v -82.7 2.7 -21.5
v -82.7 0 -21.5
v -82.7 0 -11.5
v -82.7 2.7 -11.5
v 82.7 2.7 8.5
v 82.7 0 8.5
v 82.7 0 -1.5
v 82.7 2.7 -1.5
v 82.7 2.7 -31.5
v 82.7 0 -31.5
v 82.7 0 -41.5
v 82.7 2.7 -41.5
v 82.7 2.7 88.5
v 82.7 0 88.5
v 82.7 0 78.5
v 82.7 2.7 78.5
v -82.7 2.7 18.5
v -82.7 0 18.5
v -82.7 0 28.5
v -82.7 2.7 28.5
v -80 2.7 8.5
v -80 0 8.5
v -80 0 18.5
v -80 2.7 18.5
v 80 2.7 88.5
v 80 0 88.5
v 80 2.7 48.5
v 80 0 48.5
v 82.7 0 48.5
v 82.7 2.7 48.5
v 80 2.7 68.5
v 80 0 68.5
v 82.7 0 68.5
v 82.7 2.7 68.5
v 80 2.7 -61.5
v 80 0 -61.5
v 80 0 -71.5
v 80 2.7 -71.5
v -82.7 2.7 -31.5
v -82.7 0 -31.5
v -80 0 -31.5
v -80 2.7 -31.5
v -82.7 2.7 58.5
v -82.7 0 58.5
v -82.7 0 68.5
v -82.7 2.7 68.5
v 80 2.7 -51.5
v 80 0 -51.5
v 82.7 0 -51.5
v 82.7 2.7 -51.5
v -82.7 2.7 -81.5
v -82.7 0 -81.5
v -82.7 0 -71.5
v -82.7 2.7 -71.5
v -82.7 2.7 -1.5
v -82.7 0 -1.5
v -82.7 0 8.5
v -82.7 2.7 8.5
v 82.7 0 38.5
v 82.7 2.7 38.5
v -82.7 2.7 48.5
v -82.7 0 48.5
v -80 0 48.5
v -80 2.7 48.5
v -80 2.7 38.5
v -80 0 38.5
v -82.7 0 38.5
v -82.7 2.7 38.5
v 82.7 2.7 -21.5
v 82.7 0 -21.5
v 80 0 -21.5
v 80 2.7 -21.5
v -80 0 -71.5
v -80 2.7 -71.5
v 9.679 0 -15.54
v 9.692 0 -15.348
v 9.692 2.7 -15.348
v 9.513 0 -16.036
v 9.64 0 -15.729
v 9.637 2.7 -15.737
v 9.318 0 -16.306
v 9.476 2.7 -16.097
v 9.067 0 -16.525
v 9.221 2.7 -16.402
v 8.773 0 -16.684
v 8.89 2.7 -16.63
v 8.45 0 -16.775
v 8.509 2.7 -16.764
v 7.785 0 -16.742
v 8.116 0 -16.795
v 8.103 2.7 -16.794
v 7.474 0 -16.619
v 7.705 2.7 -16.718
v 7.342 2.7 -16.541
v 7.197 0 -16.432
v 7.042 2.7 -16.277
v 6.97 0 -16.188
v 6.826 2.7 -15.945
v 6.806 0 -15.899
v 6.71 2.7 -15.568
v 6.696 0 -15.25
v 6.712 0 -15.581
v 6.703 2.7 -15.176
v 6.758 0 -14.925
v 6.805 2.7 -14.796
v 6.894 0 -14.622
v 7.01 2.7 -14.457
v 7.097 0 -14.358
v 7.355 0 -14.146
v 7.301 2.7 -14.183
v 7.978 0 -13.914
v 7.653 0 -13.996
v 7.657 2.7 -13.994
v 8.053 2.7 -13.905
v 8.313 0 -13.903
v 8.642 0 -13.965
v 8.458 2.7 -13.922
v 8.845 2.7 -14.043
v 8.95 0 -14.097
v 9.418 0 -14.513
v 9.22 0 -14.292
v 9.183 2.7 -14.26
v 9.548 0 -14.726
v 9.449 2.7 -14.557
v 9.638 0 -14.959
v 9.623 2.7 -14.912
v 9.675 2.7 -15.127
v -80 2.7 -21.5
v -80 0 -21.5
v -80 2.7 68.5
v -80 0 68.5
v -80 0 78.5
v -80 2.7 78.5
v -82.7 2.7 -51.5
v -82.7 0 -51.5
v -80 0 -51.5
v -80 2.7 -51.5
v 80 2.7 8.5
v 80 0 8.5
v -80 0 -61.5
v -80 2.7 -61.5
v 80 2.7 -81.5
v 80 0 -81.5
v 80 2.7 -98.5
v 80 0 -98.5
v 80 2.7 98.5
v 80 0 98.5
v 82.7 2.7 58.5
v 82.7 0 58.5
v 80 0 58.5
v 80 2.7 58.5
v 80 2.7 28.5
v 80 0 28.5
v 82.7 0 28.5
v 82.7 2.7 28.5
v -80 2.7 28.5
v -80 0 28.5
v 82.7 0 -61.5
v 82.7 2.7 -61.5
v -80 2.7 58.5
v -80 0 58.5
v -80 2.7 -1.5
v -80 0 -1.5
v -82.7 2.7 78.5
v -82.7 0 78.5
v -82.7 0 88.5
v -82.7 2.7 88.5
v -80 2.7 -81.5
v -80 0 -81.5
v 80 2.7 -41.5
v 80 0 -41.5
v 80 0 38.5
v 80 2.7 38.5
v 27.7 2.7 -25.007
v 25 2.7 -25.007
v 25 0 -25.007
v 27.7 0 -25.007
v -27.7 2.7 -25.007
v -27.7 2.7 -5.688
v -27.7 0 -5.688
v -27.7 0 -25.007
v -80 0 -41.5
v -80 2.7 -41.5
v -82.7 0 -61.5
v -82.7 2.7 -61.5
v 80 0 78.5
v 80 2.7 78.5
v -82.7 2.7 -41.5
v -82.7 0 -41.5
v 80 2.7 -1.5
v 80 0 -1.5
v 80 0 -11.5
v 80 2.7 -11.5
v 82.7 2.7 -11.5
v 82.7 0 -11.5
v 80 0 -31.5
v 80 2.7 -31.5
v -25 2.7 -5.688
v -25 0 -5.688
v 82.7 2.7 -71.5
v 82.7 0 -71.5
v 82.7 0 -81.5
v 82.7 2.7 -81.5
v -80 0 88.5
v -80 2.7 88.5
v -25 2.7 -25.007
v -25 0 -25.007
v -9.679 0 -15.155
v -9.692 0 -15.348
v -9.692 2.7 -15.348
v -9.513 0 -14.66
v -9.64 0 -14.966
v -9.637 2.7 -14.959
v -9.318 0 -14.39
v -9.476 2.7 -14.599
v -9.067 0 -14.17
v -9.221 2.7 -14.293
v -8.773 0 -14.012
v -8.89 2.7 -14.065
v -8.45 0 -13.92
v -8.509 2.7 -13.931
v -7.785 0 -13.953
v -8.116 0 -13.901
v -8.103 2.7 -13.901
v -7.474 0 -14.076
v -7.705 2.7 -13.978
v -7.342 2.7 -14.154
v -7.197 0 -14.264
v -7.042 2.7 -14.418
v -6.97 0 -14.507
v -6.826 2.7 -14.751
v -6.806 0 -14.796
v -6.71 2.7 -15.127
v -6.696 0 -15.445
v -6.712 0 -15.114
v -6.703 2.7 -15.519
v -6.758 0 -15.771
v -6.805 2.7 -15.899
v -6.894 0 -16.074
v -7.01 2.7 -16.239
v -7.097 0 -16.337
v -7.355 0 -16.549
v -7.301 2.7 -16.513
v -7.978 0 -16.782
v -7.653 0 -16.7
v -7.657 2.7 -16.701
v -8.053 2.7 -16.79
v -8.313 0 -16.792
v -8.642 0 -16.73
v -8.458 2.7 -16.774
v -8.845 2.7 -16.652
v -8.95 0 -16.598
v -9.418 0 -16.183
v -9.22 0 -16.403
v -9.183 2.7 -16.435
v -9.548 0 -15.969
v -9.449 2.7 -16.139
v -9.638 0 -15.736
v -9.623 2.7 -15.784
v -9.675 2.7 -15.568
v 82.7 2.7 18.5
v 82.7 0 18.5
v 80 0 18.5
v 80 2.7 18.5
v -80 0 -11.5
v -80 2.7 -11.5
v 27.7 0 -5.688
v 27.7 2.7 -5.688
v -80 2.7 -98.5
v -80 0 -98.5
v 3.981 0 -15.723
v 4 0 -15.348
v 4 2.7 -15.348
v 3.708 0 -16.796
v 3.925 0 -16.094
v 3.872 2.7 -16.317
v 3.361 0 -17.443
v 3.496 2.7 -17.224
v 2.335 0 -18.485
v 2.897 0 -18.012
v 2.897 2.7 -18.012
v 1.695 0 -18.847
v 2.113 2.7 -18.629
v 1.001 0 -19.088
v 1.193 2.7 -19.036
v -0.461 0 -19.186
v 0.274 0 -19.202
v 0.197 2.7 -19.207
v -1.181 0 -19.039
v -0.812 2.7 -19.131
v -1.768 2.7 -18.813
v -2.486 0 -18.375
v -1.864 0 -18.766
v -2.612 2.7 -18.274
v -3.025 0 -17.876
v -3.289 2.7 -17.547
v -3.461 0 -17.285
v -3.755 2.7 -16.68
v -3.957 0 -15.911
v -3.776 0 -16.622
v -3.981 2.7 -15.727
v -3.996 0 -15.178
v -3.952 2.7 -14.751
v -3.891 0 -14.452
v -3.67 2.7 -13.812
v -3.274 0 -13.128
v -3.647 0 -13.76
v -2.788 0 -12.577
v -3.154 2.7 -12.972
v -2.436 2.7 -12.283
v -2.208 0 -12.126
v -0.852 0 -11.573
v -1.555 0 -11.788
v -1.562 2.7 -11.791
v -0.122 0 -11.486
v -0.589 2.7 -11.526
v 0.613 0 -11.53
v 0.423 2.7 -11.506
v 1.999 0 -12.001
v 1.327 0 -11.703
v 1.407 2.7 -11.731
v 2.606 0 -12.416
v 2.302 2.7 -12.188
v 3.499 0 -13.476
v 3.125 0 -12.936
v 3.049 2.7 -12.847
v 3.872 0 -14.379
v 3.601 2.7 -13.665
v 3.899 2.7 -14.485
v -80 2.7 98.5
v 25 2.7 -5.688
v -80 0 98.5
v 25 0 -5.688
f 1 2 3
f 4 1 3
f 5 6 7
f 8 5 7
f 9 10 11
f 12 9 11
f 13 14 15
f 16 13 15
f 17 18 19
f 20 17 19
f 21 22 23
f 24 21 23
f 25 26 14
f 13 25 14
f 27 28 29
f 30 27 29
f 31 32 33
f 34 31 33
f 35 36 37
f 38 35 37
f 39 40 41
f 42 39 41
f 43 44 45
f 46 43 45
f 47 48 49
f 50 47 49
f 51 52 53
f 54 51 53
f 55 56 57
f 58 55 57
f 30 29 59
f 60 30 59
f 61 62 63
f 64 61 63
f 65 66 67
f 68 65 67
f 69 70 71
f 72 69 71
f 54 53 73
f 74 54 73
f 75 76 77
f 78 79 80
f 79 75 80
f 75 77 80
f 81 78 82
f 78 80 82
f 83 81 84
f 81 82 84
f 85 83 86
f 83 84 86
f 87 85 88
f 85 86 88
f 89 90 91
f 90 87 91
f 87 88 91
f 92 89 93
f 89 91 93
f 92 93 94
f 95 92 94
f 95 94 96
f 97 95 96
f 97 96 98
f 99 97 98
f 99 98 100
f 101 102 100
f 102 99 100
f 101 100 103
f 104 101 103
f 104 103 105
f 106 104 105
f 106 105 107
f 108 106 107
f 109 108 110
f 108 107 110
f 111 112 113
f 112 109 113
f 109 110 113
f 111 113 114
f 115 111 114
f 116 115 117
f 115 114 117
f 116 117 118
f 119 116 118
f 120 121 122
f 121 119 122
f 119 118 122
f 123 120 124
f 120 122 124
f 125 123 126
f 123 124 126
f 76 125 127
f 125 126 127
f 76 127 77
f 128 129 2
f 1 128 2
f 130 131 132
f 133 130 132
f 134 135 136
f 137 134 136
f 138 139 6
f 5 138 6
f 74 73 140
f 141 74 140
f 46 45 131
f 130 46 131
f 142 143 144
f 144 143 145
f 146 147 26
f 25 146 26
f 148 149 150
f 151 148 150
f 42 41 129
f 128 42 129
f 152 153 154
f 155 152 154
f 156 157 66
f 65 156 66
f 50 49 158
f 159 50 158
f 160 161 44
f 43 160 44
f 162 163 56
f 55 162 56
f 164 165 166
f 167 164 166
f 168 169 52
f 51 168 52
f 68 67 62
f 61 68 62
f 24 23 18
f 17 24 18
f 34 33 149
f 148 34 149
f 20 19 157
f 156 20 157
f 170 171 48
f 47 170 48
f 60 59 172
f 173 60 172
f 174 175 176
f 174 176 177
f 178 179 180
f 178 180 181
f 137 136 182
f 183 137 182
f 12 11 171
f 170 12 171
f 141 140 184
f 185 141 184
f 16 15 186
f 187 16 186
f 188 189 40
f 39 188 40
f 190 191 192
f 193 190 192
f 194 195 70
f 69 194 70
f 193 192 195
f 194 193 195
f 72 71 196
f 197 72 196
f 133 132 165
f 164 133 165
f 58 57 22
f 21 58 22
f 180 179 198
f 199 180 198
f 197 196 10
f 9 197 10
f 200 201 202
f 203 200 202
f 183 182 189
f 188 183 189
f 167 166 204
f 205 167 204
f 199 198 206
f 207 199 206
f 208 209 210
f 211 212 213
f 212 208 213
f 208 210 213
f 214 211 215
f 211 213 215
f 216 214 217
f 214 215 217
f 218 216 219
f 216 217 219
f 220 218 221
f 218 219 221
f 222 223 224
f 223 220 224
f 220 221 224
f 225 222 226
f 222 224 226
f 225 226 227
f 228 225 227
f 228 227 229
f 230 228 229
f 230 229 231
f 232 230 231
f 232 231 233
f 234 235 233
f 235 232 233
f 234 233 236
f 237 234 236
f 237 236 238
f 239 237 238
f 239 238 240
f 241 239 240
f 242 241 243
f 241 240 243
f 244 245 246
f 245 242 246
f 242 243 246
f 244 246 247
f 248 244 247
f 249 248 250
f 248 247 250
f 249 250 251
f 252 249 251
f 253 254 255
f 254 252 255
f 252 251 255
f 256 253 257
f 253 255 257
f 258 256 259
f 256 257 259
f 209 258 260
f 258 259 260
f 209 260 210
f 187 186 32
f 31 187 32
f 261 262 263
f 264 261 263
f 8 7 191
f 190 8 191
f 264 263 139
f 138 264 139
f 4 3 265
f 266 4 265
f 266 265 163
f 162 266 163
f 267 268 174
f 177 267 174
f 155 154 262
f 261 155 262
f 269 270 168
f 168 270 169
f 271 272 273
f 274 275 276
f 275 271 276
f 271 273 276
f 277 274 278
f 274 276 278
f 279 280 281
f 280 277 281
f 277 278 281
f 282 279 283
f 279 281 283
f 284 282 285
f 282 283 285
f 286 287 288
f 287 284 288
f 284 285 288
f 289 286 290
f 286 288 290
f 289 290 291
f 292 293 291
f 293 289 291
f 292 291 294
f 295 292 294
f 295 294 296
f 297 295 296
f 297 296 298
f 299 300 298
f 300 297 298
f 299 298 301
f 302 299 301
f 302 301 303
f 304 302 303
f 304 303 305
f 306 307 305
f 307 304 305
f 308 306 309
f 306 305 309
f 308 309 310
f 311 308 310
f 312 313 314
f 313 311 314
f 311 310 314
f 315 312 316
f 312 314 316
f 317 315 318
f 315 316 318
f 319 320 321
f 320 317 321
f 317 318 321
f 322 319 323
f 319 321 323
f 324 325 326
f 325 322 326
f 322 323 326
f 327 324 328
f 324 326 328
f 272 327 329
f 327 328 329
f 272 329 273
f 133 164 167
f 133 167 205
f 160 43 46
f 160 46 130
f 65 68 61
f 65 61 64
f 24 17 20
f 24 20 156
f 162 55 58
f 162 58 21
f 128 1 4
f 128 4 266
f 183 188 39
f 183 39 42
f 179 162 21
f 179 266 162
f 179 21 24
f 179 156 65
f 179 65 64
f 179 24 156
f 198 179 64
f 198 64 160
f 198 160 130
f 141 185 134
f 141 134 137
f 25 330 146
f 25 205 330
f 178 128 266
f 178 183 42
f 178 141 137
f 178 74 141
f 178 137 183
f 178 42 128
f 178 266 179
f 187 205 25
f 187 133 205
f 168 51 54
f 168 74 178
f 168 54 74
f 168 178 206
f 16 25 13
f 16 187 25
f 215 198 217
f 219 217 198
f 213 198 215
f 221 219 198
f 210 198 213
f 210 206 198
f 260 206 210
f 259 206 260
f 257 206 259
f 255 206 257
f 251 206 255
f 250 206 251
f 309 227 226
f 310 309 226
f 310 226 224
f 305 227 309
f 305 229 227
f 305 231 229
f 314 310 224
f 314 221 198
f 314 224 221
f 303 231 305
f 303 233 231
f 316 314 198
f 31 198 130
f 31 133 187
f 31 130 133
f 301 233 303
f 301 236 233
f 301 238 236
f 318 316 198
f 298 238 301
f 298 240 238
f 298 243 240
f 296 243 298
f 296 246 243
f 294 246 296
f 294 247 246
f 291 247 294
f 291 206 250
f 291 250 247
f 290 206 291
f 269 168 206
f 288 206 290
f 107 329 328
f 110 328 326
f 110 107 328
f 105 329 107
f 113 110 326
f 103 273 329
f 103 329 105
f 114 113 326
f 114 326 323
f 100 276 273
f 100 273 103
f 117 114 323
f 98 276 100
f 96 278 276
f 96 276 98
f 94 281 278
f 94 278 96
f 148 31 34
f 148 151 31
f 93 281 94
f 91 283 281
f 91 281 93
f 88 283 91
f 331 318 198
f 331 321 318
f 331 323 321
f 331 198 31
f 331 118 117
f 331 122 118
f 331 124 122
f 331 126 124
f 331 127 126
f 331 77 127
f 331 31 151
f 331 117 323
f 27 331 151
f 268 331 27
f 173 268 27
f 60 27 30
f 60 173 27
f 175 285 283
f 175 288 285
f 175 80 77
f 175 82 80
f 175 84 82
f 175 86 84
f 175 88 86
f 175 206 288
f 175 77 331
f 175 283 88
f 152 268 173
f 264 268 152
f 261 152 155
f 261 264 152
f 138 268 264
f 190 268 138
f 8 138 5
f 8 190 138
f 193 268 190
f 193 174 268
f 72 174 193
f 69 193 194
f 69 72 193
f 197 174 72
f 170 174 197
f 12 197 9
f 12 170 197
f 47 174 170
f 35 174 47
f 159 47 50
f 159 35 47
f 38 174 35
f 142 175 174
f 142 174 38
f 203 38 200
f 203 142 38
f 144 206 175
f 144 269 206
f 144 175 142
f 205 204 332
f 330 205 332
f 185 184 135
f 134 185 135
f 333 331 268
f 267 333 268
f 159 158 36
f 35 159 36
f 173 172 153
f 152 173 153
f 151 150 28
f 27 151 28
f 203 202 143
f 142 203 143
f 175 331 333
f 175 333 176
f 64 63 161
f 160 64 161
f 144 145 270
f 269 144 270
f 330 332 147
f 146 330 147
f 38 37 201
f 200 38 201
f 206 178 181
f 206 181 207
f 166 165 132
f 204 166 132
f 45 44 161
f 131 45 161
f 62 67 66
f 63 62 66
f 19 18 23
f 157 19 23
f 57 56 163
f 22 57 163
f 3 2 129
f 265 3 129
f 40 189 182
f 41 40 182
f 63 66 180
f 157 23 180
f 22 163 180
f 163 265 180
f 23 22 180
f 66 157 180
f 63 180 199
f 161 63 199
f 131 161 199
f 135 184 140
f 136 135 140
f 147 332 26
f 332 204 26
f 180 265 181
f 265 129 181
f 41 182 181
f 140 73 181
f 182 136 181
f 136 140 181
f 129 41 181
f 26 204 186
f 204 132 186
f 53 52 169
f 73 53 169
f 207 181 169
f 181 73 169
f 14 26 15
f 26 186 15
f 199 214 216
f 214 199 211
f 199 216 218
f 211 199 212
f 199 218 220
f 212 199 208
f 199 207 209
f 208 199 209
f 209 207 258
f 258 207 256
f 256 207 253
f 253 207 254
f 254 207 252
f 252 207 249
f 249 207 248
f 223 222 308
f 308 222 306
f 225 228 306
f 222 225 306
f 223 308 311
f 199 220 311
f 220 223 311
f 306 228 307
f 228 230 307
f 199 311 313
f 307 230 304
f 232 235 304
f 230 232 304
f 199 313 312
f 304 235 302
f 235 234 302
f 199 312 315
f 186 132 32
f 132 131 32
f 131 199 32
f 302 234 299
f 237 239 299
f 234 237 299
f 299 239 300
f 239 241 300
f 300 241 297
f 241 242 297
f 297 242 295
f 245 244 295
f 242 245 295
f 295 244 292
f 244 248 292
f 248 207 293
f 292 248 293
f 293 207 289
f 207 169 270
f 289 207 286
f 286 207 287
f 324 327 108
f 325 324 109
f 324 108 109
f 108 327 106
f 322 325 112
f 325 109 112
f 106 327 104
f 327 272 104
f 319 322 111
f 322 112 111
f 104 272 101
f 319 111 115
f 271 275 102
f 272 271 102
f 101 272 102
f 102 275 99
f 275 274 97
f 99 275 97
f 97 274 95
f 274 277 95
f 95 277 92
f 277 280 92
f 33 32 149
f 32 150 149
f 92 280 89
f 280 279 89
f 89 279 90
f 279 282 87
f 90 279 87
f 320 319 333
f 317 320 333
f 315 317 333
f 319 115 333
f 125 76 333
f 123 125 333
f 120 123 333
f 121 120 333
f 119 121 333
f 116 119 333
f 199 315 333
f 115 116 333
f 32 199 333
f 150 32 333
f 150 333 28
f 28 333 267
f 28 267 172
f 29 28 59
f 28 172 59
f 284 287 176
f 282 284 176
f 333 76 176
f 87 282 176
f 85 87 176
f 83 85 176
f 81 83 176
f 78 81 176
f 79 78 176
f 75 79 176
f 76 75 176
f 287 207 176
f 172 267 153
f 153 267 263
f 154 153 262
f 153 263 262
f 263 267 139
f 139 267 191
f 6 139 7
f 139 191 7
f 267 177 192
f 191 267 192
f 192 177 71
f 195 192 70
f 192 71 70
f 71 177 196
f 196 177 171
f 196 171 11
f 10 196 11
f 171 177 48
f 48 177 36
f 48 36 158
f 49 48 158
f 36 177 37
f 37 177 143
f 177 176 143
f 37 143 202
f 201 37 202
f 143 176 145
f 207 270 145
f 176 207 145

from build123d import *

# Parameters (mm, degrees)
BOSS_EXTRUDE2_DEPTH = 2.7
SKETCH2_RX          = 1.5
SKETCH2_RY          = 1.448888739
SKETCH2_RX_2        = 4
SKETCH2_RY_2        = 3.863703305
SKETCH2_W           = 2.7
SKETCH2_H           = 19.318516525
CUT_EXTRUDE1_DEPTH  = 3


with BuildPart() as part:
    # Sketch1 → Boss-Extrude2 (new body)
    with BuildSketch(Plane(origin=(0, 0, 0), x_dir=(1, 0, 0), z_dir=(0, 1, 0))):
        Polygon((-80, -98.5), (80, -98.5), (80, -88.5), (82.7, -88.5), (82.7, -78.5), (80, -78.5), (80, -68.5), (82.7, -68.5), (82.7, -58.5), (80, -58.5), (80, -48.5), (82.7, -48.5), (82.7, -38.5), (80, -38.5), (80, -28.5), (82.7, -28.5), (82.7, -18.5), (80, -18.5), (80, -8.5), (82.7, -8.5), (82.7, 1.5), (80, 1.5), (80, 11.5), (82.7, 11.5), (82.7, 21.5), (80, 21.5), (80, 31.5), (82.7, 31.5), (82.7, 41.5), (80, 41.5), (80, 51.5), (82.7, 51.5), (82.7, 61.5), (80, 61.5), (80, 71.5), (82.7, 71.5), (82.7, 81.5), (80, 81.5), (80, 98.5), (-80, 98.5), (-80, 81.5), (-82.7, 81.5), (-82.7, 71.5), (-80, 71.5), (-80, 61.5), (-82.7, 61.5), (-82.7, 51.5), (-80, 51.5), (-80, 41.5), (-82.7, 41.5), (-82.7, 31.5), (-80, 31.5), (-80, 21.5), (-82.7, 21.5), (-82.7, 11.5), (-80, 11.5), (-80, 1.5), (-82.7, 1.5), (-82.7, -8.5), (-80, -8.5), (-80, -18.5), (-82.7, -18.5), (-82.7, -28.5), (-80, -28.5), (-80, -38.5), (-82.7, -38.5), (-82.7, -48.5), (-80, -48.5), (-80, -58.5), (-82.7, -58.5), (-82.7, -68.5), (-80, -68.5), (-80, -78.5), (-82.7, -78.5), (-82.7, -88.5), (-80, -88.5), align=None)
    extrude(amount=BOSS_EXTRUDE2_DEPTH)

    # Sketch2 → Cut-Extrude1 (cut)
    with BuildSketch(Plane(origin=(0, 2.7, 0), x_dir=(1, 0, 0), z_dir=(0, 1, 0))):
        with Locations((8.1925, 15.347700679)):
            Ellipse(SKETCH2_RX, SKETCH2_RY)
        with Locations((0, 15.347700679)):
            Ellipse(SKETCH2_RX_2, SKETCH2_RY_2)
        with Locations(Location((-8.1925, 15.347700679), (0, 0, 180))):
            Ellipse(SKETCH2_RX, SKETCH2_RY)
        with Locations((26.35, 15.347700679)):
            Rectangle(SKETCH2_W, SKETCH2_H)
        with Locations((-26.35, 15.347700679)):
            Rectangle(SKETCH2_W, SKETCH2_H)
    extrude(amount=-CUT_EXTRUDE1_DEPTH, mode=Mode.SUBTRACT)


solid = part.part
